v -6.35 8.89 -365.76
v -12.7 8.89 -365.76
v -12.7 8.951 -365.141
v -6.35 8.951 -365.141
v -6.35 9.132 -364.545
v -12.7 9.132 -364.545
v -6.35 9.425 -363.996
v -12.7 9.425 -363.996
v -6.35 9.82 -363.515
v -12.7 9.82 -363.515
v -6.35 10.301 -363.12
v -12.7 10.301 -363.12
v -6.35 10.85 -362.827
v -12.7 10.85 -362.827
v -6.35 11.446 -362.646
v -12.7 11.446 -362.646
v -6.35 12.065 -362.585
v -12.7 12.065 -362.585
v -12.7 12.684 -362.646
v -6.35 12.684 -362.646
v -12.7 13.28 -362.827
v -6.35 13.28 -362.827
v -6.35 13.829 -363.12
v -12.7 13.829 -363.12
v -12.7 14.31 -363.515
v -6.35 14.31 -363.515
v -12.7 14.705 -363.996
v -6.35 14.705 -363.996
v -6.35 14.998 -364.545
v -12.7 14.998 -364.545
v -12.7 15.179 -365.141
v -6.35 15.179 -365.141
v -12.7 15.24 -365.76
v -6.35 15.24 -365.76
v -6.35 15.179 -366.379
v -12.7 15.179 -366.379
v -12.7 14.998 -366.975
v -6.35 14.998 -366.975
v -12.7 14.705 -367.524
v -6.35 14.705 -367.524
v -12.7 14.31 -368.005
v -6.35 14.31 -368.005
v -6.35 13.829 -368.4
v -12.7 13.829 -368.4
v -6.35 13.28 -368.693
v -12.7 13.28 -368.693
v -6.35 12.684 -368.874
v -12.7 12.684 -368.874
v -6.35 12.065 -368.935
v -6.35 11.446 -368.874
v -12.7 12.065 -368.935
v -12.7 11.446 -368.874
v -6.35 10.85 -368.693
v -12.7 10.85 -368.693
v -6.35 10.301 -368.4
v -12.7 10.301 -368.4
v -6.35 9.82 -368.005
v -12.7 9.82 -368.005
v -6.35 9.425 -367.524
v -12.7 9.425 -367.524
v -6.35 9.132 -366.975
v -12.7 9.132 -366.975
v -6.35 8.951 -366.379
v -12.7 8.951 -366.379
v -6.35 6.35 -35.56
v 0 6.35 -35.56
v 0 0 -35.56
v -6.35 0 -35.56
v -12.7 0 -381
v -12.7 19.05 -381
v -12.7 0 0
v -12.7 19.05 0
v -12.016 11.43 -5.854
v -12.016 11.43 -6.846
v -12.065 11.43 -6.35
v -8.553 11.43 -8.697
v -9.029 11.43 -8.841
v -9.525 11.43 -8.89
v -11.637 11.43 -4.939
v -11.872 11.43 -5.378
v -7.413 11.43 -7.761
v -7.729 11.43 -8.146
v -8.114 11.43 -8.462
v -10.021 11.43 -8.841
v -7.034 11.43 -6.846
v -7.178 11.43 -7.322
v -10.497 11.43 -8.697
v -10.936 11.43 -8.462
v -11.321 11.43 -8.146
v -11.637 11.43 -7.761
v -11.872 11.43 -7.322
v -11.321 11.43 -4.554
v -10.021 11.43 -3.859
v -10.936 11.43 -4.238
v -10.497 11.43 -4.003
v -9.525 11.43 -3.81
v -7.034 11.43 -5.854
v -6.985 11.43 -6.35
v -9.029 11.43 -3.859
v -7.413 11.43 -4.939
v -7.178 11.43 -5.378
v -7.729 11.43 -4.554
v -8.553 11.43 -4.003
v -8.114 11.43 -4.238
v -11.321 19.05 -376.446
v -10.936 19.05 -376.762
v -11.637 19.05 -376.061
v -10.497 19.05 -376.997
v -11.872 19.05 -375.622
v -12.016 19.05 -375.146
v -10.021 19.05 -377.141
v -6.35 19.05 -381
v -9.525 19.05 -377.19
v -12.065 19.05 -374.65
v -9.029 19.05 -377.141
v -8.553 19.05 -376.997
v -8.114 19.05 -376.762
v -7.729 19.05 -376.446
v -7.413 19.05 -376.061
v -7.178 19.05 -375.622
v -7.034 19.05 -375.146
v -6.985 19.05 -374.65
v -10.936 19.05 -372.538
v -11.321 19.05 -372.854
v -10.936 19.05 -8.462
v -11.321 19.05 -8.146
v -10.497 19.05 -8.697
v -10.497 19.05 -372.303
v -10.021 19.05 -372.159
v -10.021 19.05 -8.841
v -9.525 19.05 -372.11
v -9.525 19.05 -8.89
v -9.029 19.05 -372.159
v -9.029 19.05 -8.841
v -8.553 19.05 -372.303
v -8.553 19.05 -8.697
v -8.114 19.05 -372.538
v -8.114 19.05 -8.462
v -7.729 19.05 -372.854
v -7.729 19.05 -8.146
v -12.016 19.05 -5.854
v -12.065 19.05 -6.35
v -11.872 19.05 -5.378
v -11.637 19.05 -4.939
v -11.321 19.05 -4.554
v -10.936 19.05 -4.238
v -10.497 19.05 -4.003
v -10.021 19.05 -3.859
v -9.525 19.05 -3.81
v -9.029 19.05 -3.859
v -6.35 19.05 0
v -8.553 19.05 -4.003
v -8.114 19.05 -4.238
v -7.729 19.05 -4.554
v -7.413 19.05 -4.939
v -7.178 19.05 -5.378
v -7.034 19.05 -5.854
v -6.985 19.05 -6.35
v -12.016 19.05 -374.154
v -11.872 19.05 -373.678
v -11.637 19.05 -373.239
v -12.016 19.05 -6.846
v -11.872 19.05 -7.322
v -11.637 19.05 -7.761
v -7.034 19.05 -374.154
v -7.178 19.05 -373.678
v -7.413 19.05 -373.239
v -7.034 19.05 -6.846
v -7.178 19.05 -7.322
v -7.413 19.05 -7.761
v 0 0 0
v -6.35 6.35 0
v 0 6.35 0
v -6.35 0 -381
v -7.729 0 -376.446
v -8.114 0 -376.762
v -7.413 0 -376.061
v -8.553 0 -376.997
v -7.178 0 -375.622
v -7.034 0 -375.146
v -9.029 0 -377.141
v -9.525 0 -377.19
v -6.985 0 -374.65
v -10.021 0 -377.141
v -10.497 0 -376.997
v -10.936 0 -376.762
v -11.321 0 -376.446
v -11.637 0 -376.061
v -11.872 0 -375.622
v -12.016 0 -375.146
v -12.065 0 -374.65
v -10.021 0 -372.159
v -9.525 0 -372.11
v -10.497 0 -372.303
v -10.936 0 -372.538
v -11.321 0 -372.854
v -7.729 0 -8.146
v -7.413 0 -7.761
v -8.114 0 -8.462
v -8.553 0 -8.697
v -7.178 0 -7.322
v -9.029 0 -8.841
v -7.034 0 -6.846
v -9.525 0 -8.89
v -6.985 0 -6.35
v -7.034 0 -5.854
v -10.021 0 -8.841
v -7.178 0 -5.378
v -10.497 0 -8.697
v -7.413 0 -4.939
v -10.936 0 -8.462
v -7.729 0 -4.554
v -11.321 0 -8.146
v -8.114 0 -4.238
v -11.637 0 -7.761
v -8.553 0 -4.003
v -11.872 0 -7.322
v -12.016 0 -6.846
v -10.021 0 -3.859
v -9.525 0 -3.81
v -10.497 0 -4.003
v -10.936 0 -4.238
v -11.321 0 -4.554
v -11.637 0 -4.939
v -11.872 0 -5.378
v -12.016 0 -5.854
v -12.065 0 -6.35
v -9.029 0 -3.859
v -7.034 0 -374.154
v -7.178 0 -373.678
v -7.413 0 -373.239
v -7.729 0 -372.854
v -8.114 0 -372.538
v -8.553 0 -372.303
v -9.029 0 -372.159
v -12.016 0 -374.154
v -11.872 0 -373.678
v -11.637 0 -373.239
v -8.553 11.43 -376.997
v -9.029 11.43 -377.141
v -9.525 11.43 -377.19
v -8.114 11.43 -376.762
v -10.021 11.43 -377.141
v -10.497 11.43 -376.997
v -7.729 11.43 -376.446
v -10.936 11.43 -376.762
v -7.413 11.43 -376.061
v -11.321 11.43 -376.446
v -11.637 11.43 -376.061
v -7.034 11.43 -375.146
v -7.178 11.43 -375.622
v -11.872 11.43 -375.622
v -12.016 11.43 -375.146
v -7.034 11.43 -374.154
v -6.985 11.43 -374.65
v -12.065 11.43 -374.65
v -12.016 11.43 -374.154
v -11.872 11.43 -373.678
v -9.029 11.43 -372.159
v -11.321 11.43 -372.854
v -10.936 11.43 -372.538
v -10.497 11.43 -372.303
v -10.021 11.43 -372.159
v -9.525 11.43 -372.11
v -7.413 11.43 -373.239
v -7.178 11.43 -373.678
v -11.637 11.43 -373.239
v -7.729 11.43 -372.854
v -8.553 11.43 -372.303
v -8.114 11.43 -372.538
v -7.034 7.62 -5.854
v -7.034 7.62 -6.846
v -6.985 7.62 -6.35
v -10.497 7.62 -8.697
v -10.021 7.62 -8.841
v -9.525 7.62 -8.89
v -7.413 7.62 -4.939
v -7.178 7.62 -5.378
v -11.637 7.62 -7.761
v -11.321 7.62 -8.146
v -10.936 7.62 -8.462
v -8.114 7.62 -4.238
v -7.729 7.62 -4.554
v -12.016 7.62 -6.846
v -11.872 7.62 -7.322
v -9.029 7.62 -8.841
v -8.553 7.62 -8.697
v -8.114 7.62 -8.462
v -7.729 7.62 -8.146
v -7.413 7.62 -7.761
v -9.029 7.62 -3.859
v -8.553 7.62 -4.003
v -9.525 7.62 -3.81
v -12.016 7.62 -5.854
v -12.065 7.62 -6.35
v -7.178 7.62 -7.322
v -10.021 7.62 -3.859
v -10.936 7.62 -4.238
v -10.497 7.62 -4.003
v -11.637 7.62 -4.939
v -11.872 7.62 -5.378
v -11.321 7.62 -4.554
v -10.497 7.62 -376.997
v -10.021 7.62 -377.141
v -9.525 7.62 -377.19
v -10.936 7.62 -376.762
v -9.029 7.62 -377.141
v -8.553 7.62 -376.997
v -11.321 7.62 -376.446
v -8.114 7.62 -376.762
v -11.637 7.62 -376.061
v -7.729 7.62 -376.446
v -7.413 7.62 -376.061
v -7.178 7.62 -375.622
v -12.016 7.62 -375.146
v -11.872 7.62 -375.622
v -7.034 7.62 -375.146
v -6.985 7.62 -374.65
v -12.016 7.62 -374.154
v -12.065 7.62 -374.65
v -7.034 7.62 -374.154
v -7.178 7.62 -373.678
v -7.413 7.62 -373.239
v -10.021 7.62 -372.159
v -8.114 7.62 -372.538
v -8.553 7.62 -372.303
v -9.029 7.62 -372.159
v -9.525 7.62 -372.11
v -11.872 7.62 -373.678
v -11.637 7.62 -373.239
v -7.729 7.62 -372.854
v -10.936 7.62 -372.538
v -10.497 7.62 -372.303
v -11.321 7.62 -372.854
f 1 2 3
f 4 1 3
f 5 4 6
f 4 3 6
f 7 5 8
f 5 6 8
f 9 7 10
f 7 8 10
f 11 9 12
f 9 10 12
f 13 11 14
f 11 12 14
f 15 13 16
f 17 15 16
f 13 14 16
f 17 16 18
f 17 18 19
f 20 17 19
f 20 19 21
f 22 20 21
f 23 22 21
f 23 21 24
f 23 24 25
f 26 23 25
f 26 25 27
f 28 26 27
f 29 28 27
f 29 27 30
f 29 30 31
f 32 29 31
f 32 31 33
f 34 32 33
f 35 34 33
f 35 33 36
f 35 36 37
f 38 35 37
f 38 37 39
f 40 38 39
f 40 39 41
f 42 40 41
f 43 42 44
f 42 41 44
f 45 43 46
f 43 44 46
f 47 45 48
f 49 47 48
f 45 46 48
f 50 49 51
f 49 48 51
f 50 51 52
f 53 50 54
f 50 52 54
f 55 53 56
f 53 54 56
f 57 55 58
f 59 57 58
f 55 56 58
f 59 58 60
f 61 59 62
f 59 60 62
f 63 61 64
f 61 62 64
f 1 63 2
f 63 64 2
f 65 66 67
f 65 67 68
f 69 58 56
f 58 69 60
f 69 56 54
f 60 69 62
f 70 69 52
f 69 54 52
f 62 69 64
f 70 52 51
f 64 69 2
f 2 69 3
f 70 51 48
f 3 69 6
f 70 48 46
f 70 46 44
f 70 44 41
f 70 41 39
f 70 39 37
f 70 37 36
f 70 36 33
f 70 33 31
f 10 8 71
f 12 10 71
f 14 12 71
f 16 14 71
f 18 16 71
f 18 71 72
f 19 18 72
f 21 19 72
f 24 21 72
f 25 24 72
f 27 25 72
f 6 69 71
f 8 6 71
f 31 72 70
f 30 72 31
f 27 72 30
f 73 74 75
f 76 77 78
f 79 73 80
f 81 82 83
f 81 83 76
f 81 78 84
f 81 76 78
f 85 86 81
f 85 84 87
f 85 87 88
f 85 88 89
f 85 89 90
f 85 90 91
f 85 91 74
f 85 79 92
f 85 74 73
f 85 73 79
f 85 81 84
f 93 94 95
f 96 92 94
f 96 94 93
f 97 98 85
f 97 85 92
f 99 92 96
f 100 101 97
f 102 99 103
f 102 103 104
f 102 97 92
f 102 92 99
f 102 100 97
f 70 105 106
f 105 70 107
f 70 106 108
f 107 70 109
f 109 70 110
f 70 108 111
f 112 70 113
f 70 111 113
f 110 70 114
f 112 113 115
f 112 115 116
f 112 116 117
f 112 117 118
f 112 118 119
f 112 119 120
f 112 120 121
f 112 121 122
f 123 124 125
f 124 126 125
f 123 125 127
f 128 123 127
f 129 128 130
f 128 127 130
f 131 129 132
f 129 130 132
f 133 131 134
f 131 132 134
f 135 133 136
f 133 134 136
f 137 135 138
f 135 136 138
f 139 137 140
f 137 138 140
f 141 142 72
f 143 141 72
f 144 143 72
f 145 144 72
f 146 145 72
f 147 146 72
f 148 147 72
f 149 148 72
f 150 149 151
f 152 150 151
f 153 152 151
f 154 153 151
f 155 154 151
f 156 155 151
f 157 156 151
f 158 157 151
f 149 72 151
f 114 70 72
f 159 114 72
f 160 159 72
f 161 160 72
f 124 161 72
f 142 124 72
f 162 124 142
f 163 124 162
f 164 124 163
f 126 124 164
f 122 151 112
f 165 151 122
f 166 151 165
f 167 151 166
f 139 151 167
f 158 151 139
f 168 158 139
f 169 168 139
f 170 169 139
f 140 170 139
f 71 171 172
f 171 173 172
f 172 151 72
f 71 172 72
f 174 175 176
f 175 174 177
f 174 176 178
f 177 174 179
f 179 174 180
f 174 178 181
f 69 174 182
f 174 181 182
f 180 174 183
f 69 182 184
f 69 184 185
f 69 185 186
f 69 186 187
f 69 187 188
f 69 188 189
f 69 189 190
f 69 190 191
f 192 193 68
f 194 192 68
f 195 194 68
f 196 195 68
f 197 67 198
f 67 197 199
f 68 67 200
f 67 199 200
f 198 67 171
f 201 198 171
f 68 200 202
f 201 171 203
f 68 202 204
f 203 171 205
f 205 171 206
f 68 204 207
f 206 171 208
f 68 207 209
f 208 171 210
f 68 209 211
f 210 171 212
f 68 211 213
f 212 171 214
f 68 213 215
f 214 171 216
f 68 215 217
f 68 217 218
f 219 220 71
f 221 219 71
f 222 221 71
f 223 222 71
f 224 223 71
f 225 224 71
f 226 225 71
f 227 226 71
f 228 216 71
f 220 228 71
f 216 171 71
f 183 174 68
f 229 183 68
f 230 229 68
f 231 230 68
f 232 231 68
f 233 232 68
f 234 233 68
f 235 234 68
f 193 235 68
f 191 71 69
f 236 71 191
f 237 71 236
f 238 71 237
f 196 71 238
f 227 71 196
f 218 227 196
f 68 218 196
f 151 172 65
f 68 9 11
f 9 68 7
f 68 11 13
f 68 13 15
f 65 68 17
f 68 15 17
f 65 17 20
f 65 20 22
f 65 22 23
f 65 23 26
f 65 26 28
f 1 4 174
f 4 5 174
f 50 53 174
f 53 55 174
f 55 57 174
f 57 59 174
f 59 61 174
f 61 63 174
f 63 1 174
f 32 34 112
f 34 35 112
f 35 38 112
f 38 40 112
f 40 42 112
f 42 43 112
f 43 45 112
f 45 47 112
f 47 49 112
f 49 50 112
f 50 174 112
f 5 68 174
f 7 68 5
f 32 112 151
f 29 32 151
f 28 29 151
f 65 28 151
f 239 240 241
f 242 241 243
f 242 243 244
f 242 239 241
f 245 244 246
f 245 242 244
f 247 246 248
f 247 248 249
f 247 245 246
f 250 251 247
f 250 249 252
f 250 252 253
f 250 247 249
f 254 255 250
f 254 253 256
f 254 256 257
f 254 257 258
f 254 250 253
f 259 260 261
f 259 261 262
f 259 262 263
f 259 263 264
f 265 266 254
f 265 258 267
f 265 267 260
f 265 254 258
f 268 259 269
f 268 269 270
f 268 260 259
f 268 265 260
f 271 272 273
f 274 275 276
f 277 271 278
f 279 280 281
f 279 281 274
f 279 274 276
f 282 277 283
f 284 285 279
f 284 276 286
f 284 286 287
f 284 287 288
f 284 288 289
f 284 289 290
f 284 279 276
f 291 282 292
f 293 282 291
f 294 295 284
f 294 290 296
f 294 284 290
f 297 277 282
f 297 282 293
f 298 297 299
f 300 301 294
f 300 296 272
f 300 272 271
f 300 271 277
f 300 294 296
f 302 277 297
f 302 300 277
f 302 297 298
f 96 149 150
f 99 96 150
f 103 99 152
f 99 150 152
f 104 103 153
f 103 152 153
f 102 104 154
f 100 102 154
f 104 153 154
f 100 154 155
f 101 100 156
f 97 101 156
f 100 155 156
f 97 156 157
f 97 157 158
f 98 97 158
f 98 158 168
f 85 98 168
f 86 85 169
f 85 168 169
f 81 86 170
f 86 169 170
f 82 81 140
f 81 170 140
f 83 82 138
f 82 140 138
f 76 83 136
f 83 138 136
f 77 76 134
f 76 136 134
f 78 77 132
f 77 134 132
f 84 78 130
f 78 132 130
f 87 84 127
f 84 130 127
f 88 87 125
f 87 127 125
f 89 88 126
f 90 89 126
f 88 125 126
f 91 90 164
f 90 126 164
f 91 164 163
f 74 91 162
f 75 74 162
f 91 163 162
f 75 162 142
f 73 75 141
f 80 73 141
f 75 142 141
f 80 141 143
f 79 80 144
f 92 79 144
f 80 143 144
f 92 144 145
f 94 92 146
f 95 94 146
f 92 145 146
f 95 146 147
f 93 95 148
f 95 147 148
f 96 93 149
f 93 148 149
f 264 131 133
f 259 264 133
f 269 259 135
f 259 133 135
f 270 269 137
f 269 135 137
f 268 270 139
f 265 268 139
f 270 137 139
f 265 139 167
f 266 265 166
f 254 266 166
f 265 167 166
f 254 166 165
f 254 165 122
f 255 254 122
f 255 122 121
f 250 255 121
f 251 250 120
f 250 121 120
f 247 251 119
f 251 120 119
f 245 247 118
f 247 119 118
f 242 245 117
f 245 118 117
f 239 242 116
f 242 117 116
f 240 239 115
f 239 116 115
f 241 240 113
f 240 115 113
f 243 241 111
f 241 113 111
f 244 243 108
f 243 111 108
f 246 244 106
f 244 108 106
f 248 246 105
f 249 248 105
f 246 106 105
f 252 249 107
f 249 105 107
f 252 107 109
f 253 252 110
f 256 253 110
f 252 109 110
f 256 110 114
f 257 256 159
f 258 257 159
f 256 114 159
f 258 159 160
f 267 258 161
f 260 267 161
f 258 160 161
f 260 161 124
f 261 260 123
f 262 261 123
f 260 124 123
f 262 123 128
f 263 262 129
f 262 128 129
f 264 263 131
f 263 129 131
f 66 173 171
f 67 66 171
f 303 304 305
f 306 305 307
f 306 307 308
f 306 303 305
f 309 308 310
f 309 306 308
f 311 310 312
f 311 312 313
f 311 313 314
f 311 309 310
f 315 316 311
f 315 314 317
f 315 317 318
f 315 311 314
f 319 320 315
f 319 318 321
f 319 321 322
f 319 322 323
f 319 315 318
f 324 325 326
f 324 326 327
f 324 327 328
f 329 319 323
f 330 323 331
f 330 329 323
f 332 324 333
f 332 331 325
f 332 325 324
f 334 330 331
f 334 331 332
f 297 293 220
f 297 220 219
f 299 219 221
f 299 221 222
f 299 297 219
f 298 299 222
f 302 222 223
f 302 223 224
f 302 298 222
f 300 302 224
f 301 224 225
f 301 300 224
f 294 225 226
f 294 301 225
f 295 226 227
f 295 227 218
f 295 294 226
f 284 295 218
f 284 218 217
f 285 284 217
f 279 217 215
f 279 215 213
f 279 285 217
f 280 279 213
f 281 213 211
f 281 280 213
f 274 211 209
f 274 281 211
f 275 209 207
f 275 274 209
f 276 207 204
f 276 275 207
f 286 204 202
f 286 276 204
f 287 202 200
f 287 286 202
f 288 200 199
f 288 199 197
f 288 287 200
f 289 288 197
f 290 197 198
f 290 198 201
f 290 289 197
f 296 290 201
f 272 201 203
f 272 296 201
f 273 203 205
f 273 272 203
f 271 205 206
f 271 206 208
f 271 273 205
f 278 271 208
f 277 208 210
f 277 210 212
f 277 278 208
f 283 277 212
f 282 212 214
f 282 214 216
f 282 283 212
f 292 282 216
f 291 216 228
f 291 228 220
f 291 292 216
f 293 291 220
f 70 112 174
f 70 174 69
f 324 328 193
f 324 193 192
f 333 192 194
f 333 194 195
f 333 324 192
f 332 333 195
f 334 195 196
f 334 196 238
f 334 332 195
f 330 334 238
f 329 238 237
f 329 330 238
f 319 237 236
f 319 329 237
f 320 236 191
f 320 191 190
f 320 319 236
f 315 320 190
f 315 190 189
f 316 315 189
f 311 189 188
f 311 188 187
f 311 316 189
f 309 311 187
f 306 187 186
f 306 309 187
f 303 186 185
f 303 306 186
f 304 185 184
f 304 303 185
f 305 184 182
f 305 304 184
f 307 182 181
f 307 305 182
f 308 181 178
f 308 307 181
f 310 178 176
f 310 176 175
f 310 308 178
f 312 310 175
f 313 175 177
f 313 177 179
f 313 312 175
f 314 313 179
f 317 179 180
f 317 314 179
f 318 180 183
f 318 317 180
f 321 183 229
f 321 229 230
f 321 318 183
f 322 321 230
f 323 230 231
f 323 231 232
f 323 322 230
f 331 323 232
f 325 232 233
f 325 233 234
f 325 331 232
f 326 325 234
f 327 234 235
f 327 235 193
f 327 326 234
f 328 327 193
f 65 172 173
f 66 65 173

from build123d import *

# Parameters (mm, degrees)
BOSS_EXTRUDE1_DEPTH = 381
CUT_EXTRUDE1_REACH  = 383.687
SKETCH2_R           = 3.175
SKETCH3_R           = 2.54
CUT_EXTRUDE2_DEPTH  = 7.62
CUT_EXTRUDE3_START  = -7.62
SKETCH4_R           = 2.54
CUT_EXTRUDE3_DEPTH  = 7.62
SKETCH5_W           = 6.35
SKETCH5_H           = 6.35
CUT_EXTRUDE4_DEPTH  = 345.44


with BuildPart() as part:
    # Sketch1 → Boss-Extrude1 (new body)
    with BuildSketch(Plane.XY):
        Polygon((0, 0), (-12.7, 0), (-12.7, 19.05), (-6.35, 19.05), (-6.35, 6.35), (0, 6.35), align=None)
    extrude(amount=-BOSS_EXTRUDE1_DEPTH)

    # Sketch2 → Cut-Extrude1 (cut, up to next)
    with BuildSketch(Plane.ZY.offset(12.7), mode=Mode.PRIVATE) as cut_extrude1_sk1:
        with Locations(Location((-365.76, 12.065, 0), (0, 0, 270))):
            Circle(SKETCH2_R)
    cut_extrude1_tool1 = extrude(cut_extrude1_sk1.sketch, amount=-CUT_EXTRUDE1_REACH, mode=Mode.PRIVATE) & part.part
    add(cut_extrude1_tool1.solids().sort_by_distance((-12.7, 12.065, -365.76))[0], mode=Mode.SUBTRACT)

    # Sketch3 → Cut-Extrude2 (cut)
    with BuildSketch(Plane(origin=(0, 19.05, 0), x_dir=(1, 0, 0), z_dir=(0, 1, 0))):
        with Locations(Location((-9.525, 6.35, 0), (0, 0, 270))):
            Circle(SKETCH3_R)
        with Locations(Location((-9.525, 374.65, 0), (0, 0, 270))):
            Circle(SKETCH3_R)
    extrude(amount=-CUT_EXTRUDE2_DEPTH, mode=Mode.SUBTRACT)

    # Sketch4 → Cut-Extrude3 (cut)
    with BuildSketch(Plane.XZ.offset(CUT_EXTRUDE3_START)):
        with Locations(Location((-9.525, -374.65, 0), (0, 0, 90))):
            Circle(SKETCH4_R)
        with Locations(Location((-9.525, -6.35, 0), (0, 0, 90))):
            Circle(SKETCH4_R)
    extrude(amount=CUT_EXTRUDE3_DEPTH, mode=Mode.SUBTRACT)

    # Sketch5 → Cut-Extrude4 (cut)
    with BuildSketch(Plane(origin=(0, 0, -381), x_dir=(-1, 0, 0), z_dir=(0, 0, -1))):
        with Locations((3.175, 3.175)):
            Rectangle(SKETCH5_W, SKETCH5_H)
    extrude(amount=-CUT_EXTRUDE4_DEPTH, mode=Mode.SUBTRACT)


solid = part.part
